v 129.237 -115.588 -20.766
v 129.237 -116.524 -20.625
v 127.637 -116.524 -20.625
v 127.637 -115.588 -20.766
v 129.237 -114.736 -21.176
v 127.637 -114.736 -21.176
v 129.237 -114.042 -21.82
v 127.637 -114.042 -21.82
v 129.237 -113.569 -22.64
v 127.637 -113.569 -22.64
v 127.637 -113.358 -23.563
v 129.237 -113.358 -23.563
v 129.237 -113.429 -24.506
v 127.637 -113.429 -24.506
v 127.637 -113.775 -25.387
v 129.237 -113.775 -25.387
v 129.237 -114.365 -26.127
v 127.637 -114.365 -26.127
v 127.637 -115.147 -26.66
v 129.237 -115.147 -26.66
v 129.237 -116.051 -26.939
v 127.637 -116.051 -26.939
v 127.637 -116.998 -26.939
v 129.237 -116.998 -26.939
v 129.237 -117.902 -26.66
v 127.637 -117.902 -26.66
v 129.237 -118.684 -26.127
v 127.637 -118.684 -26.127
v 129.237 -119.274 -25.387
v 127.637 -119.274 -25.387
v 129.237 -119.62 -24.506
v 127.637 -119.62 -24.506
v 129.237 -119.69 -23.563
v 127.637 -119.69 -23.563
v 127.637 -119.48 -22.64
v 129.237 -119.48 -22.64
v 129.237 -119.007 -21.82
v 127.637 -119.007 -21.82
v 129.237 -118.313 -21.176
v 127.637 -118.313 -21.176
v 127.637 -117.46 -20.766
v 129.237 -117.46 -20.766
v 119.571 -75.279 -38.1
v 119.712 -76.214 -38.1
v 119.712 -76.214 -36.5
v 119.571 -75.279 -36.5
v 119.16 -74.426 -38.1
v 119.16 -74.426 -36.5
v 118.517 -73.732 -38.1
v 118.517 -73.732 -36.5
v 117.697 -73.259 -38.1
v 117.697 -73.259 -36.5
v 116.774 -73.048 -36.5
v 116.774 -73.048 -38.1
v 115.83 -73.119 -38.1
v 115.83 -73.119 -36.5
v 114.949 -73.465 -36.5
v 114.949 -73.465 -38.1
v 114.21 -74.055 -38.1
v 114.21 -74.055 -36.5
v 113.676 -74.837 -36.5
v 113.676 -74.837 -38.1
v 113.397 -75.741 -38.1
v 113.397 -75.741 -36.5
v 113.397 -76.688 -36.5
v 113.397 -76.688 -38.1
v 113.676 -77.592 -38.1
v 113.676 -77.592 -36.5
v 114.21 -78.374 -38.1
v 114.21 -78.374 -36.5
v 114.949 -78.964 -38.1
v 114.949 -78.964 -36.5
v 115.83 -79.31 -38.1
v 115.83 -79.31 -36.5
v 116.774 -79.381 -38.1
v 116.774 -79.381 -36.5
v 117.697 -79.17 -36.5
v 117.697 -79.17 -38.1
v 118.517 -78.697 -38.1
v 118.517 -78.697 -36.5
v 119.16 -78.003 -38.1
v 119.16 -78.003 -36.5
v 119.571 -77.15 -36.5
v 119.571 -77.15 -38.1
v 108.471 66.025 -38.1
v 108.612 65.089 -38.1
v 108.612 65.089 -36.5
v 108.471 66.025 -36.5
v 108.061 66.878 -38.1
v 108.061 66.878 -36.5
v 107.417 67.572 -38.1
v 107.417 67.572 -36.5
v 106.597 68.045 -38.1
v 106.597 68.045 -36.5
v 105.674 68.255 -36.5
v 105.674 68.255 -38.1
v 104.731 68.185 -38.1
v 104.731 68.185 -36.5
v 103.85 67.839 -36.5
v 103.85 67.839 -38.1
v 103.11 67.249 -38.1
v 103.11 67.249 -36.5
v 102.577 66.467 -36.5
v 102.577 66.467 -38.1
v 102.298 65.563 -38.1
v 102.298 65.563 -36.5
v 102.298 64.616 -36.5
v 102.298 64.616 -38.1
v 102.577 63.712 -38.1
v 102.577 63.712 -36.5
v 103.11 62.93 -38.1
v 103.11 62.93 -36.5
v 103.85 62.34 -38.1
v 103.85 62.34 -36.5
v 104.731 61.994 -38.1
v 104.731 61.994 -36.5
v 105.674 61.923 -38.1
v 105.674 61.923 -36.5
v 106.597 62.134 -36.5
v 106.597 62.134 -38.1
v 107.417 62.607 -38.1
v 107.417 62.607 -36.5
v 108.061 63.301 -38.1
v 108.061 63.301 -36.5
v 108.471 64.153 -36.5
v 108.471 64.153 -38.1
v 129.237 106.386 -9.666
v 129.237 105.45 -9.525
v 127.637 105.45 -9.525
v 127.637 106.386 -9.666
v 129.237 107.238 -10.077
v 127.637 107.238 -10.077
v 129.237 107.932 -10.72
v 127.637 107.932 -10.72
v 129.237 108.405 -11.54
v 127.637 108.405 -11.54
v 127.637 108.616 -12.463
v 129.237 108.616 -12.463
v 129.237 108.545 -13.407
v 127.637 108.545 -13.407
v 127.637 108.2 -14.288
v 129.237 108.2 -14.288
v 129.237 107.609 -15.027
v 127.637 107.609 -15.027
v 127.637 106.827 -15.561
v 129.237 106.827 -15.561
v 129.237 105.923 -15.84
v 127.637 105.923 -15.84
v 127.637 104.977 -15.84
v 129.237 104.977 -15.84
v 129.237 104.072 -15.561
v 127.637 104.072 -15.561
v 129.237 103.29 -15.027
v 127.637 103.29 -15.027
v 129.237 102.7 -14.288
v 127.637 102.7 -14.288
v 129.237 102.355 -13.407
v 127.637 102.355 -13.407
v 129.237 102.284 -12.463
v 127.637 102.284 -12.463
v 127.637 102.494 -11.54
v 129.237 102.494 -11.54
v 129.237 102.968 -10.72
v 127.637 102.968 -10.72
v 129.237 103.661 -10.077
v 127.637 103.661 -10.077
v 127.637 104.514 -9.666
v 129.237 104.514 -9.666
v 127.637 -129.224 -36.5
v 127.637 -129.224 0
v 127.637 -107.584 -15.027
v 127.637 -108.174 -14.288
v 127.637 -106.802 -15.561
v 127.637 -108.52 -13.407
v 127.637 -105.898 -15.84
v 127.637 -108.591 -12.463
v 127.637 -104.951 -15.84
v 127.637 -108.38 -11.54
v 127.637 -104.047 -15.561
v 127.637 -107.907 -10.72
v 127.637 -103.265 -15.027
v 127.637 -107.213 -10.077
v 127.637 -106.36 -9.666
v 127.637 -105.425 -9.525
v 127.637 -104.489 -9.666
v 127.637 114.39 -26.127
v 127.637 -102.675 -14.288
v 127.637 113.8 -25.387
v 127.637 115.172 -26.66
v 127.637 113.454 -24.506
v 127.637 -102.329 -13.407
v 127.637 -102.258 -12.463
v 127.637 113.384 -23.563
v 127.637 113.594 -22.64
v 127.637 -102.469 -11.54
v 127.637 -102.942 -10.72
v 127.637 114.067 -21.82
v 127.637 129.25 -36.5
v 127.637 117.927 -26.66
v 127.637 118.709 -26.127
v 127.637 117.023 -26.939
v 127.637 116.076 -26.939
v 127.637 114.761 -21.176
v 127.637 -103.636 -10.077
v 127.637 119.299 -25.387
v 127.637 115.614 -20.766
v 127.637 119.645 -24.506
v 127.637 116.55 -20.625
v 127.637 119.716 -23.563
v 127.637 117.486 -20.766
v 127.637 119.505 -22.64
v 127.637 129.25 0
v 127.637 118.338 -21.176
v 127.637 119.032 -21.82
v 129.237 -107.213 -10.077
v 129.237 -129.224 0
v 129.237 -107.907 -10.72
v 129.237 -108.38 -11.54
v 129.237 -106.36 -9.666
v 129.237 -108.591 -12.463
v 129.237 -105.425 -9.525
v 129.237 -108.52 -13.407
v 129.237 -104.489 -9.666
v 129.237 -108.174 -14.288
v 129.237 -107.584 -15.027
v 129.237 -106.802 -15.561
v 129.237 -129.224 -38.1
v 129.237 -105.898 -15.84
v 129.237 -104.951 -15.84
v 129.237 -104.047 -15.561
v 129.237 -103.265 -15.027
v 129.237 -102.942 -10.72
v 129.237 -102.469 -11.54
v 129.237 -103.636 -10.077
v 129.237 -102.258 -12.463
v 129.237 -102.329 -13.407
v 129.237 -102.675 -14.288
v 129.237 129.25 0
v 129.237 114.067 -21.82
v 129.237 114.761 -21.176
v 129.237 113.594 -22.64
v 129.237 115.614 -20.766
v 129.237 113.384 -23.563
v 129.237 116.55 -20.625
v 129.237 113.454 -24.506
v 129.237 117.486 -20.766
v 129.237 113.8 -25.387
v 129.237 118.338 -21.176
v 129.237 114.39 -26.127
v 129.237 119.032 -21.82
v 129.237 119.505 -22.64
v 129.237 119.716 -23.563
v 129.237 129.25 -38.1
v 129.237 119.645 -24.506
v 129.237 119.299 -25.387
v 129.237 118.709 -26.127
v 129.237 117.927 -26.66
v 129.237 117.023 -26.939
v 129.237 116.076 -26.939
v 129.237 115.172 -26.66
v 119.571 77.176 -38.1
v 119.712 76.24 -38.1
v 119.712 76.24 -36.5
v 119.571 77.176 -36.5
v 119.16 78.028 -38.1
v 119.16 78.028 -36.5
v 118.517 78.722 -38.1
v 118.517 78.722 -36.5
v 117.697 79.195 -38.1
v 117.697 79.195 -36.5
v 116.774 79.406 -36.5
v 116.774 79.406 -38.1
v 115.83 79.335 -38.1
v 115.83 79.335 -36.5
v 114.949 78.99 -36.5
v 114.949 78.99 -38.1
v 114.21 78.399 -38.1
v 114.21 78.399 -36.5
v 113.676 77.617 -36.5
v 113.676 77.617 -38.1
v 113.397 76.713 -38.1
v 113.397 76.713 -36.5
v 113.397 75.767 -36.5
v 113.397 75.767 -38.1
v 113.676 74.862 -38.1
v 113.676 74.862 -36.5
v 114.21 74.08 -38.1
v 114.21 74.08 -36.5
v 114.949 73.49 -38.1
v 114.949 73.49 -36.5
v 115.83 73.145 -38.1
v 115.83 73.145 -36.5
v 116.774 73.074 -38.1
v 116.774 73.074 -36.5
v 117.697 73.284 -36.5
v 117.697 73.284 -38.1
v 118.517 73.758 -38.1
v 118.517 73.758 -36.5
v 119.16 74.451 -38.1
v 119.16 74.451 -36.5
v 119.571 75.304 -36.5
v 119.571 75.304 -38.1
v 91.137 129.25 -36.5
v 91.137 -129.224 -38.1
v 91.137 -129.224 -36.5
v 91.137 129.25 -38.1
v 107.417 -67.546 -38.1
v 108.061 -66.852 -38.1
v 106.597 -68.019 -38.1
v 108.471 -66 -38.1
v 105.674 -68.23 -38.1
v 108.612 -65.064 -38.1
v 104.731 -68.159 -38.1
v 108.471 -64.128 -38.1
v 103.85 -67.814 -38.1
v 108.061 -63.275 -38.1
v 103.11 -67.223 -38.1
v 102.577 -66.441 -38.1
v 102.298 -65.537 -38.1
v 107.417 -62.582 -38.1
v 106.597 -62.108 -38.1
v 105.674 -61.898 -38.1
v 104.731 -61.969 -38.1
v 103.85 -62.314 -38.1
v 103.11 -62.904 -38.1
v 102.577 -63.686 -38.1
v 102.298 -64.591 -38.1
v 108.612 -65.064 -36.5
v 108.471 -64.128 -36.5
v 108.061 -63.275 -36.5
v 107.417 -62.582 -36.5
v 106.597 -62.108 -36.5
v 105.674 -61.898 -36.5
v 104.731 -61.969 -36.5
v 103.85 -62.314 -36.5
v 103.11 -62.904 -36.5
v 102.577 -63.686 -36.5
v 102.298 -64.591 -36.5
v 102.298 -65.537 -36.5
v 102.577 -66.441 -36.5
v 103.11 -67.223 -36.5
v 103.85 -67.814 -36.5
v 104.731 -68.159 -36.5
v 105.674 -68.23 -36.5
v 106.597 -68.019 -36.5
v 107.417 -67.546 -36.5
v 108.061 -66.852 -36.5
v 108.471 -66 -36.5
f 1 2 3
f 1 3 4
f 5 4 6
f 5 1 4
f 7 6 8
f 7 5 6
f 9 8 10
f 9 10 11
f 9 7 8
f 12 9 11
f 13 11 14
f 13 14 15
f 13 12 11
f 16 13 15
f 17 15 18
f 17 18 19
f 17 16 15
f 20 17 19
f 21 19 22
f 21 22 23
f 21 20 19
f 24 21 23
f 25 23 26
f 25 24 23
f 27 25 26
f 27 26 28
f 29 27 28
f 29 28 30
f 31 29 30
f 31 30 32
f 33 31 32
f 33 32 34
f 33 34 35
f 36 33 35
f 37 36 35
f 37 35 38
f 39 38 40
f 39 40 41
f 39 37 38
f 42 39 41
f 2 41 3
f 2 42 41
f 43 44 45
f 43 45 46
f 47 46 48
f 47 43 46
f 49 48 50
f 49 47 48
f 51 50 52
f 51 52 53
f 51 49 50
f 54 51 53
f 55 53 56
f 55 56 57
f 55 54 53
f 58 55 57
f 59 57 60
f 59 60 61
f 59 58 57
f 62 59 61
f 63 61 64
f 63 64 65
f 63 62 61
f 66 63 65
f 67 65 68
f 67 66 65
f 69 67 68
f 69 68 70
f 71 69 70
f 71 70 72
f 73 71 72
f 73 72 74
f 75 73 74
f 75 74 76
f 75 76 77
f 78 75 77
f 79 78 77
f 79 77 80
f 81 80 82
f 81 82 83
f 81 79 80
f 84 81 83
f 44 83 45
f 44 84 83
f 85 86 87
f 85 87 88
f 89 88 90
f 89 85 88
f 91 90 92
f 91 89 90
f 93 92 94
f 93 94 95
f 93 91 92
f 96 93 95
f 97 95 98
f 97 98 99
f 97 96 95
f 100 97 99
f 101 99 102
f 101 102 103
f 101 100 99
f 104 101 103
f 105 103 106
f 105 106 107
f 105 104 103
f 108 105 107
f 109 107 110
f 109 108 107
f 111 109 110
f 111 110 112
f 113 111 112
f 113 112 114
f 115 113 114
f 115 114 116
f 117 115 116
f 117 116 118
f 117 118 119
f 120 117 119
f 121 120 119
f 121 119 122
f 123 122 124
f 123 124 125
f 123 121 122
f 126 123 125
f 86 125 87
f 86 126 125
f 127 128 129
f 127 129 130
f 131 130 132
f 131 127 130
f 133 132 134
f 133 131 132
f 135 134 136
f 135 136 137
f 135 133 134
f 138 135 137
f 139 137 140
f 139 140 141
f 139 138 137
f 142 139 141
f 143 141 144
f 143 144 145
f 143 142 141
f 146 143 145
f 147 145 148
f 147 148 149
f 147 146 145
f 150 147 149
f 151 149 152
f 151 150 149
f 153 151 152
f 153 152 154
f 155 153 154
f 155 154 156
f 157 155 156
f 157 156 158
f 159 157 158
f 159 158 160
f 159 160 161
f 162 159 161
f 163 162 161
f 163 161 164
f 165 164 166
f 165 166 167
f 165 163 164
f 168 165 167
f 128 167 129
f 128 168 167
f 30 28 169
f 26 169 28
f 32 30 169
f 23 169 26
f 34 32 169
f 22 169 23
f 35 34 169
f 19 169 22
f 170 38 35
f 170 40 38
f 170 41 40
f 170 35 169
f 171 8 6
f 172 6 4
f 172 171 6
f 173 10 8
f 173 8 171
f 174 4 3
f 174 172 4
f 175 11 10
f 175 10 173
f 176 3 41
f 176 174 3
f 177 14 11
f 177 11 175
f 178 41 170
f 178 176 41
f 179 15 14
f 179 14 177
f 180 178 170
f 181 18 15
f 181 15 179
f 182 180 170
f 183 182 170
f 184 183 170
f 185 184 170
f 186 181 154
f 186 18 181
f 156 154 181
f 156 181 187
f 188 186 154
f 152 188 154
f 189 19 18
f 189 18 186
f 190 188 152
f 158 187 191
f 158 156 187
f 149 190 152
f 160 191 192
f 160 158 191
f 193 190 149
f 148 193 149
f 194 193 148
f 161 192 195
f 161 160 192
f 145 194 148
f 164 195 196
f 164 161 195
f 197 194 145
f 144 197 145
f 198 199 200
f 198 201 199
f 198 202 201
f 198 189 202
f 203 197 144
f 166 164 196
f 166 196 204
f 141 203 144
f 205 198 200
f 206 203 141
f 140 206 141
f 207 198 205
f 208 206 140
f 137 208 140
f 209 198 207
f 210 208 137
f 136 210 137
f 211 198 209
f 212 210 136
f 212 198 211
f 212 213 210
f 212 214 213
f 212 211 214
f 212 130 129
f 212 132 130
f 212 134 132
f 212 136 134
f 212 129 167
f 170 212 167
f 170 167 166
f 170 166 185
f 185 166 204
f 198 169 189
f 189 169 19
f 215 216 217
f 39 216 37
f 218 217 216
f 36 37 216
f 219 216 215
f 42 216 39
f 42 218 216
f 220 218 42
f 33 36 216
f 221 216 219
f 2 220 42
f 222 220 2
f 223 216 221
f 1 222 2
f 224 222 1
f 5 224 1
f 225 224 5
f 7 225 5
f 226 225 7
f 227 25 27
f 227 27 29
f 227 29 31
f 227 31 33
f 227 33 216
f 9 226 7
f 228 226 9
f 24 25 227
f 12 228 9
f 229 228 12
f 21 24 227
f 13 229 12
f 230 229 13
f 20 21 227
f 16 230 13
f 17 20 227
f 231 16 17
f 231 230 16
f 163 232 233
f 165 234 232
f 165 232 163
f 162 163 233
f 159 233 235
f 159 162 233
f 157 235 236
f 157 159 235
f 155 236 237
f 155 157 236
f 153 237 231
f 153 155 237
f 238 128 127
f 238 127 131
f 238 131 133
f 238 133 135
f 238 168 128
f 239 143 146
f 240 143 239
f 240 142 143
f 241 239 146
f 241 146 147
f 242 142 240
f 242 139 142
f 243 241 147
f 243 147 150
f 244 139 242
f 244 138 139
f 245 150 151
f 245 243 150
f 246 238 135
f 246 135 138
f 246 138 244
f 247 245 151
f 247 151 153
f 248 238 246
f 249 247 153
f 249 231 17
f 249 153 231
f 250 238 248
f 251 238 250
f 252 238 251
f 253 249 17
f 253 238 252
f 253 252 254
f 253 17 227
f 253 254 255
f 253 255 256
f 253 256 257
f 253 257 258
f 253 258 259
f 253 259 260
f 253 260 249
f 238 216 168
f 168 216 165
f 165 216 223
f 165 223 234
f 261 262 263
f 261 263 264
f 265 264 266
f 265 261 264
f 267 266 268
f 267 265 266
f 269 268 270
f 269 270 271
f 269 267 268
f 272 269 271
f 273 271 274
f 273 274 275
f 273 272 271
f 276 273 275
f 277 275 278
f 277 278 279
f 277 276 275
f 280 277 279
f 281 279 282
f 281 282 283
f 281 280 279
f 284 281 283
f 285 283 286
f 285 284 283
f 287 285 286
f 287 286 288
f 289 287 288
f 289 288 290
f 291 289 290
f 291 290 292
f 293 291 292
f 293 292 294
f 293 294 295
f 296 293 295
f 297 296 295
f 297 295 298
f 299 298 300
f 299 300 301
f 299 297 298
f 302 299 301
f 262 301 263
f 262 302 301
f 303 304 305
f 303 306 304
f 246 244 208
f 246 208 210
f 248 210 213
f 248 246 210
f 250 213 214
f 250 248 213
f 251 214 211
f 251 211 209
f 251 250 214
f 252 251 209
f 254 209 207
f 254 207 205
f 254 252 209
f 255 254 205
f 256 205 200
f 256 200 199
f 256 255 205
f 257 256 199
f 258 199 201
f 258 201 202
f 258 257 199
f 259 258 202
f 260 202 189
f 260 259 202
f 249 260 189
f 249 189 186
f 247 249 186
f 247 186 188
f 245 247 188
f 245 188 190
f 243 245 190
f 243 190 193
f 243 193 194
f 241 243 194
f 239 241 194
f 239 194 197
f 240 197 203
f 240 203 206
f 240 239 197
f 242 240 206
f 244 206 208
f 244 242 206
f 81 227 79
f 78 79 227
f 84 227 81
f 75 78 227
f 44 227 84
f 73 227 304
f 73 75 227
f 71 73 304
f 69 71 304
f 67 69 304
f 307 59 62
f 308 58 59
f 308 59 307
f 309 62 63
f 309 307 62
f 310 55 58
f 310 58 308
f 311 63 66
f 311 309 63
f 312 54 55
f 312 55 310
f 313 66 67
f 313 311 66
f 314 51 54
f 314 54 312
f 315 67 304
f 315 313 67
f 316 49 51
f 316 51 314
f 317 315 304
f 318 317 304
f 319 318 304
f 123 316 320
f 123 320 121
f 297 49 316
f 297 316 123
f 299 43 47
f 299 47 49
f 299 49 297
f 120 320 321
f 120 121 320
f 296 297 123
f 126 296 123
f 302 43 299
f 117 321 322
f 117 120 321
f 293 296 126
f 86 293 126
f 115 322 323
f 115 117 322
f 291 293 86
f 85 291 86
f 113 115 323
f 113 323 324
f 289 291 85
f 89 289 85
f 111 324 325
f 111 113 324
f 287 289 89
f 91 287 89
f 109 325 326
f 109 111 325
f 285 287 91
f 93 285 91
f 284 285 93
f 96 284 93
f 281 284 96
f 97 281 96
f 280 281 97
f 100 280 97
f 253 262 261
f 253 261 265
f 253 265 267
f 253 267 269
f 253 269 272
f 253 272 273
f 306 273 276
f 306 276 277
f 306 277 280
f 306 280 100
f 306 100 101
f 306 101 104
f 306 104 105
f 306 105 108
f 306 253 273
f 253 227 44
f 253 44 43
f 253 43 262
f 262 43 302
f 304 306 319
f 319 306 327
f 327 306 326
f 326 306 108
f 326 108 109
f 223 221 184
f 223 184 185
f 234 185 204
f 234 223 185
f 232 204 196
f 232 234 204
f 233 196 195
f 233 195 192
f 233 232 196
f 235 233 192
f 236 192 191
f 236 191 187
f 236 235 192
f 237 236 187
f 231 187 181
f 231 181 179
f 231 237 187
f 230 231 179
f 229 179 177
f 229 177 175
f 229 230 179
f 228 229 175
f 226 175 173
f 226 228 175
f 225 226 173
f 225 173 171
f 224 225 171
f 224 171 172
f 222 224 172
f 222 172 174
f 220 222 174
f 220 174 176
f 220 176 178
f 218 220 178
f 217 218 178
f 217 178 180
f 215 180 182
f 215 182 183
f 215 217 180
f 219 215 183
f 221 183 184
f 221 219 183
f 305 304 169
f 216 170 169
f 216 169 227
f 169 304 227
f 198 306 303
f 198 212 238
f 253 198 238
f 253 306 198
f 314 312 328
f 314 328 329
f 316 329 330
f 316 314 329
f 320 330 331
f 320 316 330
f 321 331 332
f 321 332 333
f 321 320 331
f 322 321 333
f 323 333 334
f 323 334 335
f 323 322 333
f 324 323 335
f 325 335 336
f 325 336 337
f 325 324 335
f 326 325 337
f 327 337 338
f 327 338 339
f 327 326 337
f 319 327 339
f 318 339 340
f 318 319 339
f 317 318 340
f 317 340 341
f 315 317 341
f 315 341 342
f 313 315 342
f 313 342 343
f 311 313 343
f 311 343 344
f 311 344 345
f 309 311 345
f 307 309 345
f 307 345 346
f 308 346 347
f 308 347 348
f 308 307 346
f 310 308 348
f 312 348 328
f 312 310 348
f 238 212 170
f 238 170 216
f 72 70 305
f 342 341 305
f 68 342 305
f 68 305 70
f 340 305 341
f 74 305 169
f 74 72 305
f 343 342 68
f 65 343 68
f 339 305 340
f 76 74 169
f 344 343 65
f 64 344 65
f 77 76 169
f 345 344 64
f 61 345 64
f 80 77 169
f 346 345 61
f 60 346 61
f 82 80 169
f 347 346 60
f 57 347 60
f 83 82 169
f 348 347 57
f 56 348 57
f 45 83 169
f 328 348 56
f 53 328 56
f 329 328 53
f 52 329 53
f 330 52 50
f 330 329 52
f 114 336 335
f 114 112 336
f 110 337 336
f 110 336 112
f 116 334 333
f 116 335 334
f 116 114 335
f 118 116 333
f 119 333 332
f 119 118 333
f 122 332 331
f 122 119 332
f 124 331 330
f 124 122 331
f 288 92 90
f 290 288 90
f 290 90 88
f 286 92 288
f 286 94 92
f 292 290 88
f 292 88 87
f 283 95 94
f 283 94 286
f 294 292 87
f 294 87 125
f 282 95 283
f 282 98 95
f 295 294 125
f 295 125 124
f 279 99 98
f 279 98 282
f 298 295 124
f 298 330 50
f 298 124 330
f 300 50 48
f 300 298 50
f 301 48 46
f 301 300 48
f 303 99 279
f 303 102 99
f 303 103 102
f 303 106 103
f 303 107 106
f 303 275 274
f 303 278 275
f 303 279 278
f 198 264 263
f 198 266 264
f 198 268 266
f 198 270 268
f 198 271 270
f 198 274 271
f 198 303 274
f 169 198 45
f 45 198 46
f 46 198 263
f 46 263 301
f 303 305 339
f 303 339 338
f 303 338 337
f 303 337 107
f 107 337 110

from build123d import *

# Parameters (mm, degrees)
PAD001_DEPTH      = 129.237
PAD001_DEPTH_BACK = 129.237
SKETCH005_R       = 3.175
POCKET002_DEPTH   = 1.6002
SKETCH010_R       = 3.175
POCKET003_DEPTH   = 1.6002


with BuildPart() as pocket003:
    # Sketch003 → Pad001 (new body, two sides)
    with BuildSketch(Plane(origin=(-129.237, 0, -38.1), x_dir=(1, 0, 0), z_dir=(0, 1, 0))) as pad001_sk:
        Polygon((0, 0), (38.1, 0), (38.1, -1.6002), (1.6002, -1.6002), (1.6002, -38.1), (0, -38.1), align=None)
    extrude(amount=PAD001_DEPTH)
    extrude(pad001_sk.sketch, amount=-PAD001_DEPTH_BACK)

    # Sketch005 → Pocket002 (cut)
    with BuildSketch(Plane(origin=(-129.237, 0, -38.1), x_dir=(0, 0, 1), z_dir=(-1, 0, 0))):
        with Locations((25.4, 105.4372)):
            Circle(SKETCH005_R)
        with Locations((14.3002, 116.537)):
            Circle(SKETCH005_R)
        with Locations((25.4, -105.4372)):
            Circle(SKETCH005_R)
        with Locations((14.3002, -116.537)):
            Circle(SKETCH005_R)
    extrude(amount=-POCKET002_DEPTH, mode=Mode.SUBTRACT)

    # Sketch010 → Pocket003 (cut)
    with BuildSketch(Plane(origin=(-129.237, 0, -38.1), x_dir=(-1, 0, 0), z_dir=(0, 0, -1))):
        with Locations((-23.7998, -65.0766)):
            Circle(SKETCH010_R)
        with Locations((-12.7, -76.2272)):
            Circle(SKETCH010_R)
        with Locations((-23.7998, 65.0766)):
            Circle(SKETCH010_R)
        with Locations((-12.7, 76.2272)):
            Circle(SKETCH010_R)
    extrude(amount=-POCKET003_DEPTH, mode=Mode.SUBTRACT)


with BuildPart() as part_mirroring:
    # Part__Mirroring: instance of Pocket003
    add(pocket003.part.mirror(Plane(origin=(0, 0, 0), x_dir=(0, -1, 0), z_dir=(1, 0, 0))))


with BuildPart() as part_mirroring_1:
    # Part__Mirroring placement: moved
    add(part_mirroring.part.moved(Location((0, 0.0127, 0))))


solid = part_mirroring_1.part
